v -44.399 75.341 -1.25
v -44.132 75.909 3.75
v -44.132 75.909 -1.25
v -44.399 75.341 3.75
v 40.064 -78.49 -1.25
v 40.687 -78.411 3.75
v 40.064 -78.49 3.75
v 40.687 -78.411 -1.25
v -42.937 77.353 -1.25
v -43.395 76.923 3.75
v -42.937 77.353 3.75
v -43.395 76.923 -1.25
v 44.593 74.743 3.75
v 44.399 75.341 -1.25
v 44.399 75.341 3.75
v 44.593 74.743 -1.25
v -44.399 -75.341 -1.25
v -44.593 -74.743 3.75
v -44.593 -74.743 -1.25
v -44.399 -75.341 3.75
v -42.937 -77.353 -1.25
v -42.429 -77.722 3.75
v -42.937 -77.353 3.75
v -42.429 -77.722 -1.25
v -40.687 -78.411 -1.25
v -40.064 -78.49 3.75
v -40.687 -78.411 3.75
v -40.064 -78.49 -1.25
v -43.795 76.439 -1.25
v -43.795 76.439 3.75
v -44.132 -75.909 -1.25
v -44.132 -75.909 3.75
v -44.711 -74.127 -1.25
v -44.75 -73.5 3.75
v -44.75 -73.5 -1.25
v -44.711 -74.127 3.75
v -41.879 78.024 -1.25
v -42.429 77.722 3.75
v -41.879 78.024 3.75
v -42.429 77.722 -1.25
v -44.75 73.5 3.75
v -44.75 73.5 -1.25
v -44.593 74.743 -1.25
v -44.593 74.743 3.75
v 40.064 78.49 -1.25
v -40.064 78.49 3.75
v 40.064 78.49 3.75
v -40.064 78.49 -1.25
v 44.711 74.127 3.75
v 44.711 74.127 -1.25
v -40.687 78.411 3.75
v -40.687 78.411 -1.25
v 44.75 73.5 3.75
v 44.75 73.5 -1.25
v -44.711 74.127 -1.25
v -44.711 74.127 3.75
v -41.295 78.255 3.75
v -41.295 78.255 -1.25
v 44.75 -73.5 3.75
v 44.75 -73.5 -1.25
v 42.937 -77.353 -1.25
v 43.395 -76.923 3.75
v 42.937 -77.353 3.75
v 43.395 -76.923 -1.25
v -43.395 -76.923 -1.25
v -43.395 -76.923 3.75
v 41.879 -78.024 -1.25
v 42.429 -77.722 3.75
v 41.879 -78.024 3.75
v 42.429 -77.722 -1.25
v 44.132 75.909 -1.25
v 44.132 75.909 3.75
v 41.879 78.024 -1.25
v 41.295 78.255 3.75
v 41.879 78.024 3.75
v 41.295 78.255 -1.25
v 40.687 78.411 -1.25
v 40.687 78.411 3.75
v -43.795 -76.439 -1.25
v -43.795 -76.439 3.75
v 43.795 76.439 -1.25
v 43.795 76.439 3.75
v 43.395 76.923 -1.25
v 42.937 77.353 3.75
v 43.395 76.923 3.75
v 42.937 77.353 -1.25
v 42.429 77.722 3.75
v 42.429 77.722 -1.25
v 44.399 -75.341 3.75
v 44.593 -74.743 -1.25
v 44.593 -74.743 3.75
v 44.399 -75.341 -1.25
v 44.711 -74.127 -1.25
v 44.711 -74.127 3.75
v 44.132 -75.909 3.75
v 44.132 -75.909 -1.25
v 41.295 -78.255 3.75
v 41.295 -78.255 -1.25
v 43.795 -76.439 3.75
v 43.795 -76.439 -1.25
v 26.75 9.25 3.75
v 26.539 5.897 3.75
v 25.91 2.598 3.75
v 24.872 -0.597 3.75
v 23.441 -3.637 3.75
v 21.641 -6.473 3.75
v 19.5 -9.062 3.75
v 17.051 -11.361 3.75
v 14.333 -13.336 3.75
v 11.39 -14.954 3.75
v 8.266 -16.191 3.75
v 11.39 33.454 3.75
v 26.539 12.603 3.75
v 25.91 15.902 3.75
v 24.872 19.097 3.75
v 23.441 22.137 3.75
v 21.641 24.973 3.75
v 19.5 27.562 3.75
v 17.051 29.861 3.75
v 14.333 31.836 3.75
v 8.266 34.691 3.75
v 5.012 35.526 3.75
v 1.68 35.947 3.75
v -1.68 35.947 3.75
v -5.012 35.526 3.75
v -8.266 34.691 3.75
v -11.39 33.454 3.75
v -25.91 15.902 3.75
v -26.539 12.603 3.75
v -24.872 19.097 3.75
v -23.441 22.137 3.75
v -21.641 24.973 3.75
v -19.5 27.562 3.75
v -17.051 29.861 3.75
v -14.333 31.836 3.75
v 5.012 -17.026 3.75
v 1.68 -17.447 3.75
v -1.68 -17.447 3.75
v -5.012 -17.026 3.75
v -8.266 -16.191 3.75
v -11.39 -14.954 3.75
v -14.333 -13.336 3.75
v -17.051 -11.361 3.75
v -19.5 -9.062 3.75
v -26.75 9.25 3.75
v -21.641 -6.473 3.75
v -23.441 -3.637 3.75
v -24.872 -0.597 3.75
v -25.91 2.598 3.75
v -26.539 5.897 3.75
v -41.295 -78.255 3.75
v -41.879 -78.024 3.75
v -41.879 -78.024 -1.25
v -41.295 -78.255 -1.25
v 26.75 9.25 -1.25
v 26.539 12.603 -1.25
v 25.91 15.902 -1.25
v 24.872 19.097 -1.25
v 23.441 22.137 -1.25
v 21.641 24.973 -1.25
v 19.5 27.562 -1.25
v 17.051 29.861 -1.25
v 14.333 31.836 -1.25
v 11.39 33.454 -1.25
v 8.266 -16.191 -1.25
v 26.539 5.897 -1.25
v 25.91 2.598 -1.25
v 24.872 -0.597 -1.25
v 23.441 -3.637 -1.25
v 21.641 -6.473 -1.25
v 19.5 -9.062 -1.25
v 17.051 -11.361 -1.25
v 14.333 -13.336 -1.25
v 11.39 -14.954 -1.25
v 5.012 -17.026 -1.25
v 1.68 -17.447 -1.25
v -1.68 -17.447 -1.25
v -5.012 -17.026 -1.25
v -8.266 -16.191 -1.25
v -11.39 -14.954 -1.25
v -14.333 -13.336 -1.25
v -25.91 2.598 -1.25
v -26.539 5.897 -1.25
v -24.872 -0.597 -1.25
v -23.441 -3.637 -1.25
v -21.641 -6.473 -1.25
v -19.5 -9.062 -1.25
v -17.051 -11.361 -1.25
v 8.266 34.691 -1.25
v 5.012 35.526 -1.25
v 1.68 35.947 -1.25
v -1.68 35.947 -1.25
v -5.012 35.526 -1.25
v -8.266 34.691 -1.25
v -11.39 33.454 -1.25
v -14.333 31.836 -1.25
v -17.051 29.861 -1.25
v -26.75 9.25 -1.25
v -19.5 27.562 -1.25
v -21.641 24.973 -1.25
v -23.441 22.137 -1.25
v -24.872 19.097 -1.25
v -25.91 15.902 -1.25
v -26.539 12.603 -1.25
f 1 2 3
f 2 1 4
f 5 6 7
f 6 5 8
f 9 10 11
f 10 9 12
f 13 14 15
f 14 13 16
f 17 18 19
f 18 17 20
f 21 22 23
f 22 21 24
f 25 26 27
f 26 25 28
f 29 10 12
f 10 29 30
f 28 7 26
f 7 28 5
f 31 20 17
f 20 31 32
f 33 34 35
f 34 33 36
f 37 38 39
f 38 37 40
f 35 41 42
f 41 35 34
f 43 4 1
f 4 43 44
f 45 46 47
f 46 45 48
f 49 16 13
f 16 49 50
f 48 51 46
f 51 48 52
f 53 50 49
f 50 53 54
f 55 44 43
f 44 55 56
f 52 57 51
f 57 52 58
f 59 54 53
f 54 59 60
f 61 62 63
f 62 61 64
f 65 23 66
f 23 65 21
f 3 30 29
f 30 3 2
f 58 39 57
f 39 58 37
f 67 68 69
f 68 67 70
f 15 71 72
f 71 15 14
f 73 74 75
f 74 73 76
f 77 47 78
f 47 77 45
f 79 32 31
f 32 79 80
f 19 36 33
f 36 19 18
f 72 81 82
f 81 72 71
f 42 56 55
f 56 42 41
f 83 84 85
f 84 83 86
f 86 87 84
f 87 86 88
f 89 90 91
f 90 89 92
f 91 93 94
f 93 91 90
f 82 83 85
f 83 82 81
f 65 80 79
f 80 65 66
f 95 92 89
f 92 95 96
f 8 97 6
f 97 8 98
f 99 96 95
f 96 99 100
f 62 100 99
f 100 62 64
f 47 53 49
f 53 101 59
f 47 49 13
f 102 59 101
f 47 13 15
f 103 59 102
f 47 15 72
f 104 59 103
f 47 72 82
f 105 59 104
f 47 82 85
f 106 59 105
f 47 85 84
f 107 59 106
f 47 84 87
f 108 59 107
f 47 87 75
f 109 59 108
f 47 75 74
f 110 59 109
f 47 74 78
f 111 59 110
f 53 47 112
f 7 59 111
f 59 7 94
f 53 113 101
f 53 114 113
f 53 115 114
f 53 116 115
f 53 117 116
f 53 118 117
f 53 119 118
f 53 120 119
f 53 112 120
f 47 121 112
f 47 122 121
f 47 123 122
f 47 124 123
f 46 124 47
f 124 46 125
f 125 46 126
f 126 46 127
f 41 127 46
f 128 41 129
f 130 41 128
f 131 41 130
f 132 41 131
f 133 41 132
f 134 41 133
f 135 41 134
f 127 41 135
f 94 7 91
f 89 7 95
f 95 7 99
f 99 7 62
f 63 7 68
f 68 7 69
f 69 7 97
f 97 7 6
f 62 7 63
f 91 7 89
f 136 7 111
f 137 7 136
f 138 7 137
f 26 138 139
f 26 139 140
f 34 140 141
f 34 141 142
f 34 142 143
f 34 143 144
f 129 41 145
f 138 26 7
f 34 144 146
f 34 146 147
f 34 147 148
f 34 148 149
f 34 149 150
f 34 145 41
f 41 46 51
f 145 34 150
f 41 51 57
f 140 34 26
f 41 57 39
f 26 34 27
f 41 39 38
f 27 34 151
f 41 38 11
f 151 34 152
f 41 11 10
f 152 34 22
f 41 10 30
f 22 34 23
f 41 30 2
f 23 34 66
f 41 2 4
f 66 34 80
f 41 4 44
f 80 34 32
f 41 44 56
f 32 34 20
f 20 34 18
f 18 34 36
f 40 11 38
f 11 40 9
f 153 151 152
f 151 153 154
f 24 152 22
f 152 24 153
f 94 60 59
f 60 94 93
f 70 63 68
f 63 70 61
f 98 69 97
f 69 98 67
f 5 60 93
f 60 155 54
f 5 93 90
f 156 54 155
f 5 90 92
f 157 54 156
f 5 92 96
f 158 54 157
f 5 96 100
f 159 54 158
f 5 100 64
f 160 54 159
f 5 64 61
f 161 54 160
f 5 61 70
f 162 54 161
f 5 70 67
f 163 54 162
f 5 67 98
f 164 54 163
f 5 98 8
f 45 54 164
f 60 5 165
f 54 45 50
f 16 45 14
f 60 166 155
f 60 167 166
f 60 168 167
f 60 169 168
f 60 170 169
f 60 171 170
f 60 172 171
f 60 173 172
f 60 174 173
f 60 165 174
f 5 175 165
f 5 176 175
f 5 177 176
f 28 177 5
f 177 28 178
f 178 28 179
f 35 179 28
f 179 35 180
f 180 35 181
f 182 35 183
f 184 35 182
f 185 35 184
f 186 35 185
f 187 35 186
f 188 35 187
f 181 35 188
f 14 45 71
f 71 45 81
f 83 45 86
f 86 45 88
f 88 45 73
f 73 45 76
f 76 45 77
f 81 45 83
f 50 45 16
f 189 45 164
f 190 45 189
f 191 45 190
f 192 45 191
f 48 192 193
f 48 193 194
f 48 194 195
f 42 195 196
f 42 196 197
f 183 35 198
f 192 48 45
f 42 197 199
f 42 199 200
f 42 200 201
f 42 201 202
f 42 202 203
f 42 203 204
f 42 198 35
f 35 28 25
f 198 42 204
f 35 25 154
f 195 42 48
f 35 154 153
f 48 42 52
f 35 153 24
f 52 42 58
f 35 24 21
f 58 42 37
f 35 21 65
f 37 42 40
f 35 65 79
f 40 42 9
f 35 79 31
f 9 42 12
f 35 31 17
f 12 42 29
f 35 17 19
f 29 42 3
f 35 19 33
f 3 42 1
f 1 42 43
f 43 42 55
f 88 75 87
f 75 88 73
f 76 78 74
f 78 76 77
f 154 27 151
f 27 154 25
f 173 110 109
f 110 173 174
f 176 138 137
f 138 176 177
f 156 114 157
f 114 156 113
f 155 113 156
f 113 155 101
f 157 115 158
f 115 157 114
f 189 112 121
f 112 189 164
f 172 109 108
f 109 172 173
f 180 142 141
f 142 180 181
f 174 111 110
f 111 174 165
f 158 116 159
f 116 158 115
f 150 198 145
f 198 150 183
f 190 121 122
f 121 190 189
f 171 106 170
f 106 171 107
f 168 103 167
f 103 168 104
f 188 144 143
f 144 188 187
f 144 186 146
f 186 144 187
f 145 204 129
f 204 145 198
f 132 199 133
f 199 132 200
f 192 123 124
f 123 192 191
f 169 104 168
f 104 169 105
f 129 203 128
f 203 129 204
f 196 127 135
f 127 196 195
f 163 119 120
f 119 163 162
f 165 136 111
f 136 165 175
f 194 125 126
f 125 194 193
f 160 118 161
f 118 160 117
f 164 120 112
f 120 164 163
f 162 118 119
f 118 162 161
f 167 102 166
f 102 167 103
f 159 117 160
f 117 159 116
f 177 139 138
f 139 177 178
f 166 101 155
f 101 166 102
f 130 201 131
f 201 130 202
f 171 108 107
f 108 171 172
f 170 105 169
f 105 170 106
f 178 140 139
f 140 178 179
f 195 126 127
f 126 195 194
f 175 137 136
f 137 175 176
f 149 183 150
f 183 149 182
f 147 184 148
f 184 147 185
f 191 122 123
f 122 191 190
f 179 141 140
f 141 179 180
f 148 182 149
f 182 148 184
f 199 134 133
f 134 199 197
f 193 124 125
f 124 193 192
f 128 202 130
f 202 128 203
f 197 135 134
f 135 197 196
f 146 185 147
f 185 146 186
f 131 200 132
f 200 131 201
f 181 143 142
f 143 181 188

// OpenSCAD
$fn=50;

lock_height = 93.0;
lock_width = 63.5;

margin_y = 27.0;
margin_x = 8;

plate_height = lock_height + 2 * margin_y;
plate_width = lock_width + 2 * margin_x;

hole_diameter = 53.5;
hole_top_to_lock_top = 29;

thickness = 2.5;
rounding_radius = 5;

hole_offset = hole_top_to_lock_top - (lock_height/2 - hole_diameter/2);
echo(lock_height/2 - hole_diameter/2, hole_offset);

module plate() {
    minkowski() {
        cube([plate_width, plate_height, thickness], center = true);
        cylinder(r = rounding_radius, h = thickness);
    }
}

module lock_cutout() {
    translate([0, hole_offset, 0])
        cylinder(thickness*5, d = hole_diameter, center=true);
}

module finished_plate() {
    difference() {
        plate();
        lock_cutout();
    }
}

finished_plate();
